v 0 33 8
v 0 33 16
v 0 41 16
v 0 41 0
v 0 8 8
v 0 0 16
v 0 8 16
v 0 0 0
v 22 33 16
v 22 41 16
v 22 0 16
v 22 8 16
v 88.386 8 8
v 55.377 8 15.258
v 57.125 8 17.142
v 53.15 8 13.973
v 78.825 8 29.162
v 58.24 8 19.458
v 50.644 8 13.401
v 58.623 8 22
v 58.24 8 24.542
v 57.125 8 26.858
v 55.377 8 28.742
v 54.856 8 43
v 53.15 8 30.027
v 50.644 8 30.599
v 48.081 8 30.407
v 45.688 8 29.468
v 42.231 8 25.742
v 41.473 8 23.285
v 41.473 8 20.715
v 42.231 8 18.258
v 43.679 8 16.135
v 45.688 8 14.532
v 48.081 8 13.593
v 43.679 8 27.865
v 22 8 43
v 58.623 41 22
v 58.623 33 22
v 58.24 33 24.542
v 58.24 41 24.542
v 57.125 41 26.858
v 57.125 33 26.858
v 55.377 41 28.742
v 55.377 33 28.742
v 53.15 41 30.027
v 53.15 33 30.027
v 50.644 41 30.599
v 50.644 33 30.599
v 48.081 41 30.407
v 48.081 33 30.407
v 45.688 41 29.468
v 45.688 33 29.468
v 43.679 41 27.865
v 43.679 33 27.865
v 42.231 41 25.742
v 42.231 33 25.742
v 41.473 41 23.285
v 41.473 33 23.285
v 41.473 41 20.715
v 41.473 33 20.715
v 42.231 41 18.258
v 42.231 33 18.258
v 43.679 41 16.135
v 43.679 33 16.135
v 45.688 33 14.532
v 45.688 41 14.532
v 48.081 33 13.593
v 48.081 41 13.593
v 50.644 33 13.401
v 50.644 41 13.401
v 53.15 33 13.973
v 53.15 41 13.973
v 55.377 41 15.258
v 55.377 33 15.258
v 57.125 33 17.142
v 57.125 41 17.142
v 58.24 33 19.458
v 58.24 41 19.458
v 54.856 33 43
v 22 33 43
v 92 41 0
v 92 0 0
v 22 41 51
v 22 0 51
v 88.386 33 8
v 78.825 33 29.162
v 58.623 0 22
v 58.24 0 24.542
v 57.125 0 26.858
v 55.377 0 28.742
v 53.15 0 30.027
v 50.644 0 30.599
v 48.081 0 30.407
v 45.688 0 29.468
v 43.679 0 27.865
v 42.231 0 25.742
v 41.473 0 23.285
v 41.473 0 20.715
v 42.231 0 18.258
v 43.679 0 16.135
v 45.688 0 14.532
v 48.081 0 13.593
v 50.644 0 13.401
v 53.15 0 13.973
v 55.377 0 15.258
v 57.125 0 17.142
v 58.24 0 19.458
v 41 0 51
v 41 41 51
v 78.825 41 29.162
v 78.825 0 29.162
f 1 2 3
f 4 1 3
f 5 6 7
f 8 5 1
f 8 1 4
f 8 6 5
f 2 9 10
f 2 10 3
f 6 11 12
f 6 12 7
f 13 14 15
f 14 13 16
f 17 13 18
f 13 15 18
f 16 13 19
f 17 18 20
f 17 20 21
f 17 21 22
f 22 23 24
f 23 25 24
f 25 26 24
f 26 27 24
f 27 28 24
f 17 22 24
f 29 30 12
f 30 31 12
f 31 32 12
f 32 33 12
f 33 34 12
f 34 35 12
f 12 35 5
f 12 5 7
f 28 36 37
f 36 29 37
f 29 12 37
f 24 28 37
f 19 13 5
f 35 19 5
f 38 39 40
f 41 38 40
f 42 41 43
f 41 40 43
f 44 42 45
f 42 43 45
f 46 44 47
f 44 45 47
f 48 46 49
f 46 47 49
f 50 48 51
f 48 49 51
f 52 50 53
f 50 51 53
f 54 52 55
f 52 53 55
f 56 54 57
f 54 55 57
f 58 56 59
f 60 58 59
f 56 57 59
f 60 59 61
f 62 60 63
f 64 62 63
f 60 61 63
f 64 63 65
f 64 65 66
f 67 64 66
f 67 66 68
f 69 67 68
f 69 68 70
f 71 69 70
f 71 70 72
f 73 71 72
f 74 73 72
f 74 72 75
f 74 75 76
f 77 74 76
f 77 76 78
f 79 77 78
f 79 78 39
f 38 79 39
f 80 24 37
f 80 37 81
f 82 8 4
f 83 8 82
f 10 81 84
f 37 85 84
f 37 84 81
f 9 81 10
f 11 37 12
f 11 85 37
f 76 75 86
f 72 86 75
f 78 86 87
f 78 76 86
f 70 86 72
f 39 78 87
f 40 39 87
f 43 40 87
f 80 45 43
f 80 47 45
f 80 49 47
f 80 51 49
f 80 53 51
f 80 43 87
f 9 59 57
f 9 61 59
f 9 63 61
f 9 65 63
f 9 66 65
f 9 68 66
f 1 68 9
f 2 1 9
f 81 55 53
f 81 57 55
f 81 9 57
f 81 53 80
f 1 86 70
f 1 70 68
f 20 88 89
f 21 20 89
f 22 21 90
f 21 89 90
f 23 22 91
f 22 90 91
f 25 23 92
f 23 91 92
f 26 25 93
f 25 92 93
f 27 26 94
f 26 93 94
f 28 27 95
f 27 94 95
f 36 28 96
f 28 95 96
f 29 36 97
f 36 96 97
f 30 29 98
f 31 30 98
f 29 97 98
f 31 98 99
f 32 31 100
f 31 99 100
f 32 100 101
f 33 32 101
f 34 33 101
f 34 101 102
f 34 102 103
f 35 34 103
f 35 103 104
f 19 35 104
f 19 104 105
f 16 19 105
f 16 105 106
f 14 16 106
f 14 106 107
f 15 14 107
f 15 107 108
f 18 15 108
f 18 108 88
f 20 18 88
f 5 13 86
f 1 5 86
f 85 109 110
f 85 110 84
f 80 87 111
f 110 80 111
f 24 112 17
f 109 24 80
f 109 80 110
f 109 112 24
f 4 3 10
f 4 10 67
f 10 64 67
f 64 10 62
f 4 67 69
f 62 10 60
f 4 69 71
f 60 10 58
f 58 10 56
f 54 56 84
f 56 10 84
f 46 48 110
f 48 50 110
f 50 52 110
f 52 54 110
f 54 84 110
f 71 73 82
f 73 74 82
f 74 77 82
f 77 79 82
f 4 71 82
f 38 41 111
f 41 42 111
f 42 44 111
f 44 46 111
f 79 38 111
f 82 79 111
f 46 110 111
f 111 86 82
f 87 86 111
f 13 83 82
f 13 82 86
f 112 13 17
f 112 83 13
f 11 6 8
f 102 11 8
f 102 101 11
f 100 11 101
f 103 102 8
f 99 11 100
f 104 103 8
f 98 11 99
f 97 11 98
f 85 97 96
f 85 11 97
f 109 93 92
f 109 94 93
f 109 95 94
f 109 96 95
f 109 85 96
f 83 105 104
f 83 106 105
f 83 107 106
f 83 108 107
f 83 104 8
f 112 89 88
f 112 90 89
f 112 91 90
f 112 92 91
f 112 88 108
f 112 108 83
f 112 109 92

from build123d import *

# Parameters (mm, degrees)
F1_DEPTH = 41
F2_W     = 25
F2_H     = 35
F3_DEPTH = 92.001
F4_R     = 8.623428
F5_DEPTH = 41.001


with BuildPart() as f1:
    # F0 (on Front) → F1 (new body)
    with BuildSketch(Plane.XZ):
        Polygon((0, 16), (0, 0), (92, 0), (78.824782, 29.161852), (41, 51), (22, 51), (22, 16), align=None)
    extrude(amount=-F1_DEPTH)

    # F2 (on Right) → F3 (cut, through all)
    with BuildSketch(Plane.YZ):
        with Locations((20.5, 25.5)):
            Rectangle(F2_W, F2_H)
    extrude(amount=F3_DEPTH, mode=Mode.SUBTRACT)

    # F4 (on face) → F5 (cut, through all)
    with BuildSketch(Plane.XZ):
        with Locations((50, 22)):
            Circle(F4_R)
    extrude(amount=-F5_DEPTH, mode=Mode.SUBTRACT)


solid = f1.part
